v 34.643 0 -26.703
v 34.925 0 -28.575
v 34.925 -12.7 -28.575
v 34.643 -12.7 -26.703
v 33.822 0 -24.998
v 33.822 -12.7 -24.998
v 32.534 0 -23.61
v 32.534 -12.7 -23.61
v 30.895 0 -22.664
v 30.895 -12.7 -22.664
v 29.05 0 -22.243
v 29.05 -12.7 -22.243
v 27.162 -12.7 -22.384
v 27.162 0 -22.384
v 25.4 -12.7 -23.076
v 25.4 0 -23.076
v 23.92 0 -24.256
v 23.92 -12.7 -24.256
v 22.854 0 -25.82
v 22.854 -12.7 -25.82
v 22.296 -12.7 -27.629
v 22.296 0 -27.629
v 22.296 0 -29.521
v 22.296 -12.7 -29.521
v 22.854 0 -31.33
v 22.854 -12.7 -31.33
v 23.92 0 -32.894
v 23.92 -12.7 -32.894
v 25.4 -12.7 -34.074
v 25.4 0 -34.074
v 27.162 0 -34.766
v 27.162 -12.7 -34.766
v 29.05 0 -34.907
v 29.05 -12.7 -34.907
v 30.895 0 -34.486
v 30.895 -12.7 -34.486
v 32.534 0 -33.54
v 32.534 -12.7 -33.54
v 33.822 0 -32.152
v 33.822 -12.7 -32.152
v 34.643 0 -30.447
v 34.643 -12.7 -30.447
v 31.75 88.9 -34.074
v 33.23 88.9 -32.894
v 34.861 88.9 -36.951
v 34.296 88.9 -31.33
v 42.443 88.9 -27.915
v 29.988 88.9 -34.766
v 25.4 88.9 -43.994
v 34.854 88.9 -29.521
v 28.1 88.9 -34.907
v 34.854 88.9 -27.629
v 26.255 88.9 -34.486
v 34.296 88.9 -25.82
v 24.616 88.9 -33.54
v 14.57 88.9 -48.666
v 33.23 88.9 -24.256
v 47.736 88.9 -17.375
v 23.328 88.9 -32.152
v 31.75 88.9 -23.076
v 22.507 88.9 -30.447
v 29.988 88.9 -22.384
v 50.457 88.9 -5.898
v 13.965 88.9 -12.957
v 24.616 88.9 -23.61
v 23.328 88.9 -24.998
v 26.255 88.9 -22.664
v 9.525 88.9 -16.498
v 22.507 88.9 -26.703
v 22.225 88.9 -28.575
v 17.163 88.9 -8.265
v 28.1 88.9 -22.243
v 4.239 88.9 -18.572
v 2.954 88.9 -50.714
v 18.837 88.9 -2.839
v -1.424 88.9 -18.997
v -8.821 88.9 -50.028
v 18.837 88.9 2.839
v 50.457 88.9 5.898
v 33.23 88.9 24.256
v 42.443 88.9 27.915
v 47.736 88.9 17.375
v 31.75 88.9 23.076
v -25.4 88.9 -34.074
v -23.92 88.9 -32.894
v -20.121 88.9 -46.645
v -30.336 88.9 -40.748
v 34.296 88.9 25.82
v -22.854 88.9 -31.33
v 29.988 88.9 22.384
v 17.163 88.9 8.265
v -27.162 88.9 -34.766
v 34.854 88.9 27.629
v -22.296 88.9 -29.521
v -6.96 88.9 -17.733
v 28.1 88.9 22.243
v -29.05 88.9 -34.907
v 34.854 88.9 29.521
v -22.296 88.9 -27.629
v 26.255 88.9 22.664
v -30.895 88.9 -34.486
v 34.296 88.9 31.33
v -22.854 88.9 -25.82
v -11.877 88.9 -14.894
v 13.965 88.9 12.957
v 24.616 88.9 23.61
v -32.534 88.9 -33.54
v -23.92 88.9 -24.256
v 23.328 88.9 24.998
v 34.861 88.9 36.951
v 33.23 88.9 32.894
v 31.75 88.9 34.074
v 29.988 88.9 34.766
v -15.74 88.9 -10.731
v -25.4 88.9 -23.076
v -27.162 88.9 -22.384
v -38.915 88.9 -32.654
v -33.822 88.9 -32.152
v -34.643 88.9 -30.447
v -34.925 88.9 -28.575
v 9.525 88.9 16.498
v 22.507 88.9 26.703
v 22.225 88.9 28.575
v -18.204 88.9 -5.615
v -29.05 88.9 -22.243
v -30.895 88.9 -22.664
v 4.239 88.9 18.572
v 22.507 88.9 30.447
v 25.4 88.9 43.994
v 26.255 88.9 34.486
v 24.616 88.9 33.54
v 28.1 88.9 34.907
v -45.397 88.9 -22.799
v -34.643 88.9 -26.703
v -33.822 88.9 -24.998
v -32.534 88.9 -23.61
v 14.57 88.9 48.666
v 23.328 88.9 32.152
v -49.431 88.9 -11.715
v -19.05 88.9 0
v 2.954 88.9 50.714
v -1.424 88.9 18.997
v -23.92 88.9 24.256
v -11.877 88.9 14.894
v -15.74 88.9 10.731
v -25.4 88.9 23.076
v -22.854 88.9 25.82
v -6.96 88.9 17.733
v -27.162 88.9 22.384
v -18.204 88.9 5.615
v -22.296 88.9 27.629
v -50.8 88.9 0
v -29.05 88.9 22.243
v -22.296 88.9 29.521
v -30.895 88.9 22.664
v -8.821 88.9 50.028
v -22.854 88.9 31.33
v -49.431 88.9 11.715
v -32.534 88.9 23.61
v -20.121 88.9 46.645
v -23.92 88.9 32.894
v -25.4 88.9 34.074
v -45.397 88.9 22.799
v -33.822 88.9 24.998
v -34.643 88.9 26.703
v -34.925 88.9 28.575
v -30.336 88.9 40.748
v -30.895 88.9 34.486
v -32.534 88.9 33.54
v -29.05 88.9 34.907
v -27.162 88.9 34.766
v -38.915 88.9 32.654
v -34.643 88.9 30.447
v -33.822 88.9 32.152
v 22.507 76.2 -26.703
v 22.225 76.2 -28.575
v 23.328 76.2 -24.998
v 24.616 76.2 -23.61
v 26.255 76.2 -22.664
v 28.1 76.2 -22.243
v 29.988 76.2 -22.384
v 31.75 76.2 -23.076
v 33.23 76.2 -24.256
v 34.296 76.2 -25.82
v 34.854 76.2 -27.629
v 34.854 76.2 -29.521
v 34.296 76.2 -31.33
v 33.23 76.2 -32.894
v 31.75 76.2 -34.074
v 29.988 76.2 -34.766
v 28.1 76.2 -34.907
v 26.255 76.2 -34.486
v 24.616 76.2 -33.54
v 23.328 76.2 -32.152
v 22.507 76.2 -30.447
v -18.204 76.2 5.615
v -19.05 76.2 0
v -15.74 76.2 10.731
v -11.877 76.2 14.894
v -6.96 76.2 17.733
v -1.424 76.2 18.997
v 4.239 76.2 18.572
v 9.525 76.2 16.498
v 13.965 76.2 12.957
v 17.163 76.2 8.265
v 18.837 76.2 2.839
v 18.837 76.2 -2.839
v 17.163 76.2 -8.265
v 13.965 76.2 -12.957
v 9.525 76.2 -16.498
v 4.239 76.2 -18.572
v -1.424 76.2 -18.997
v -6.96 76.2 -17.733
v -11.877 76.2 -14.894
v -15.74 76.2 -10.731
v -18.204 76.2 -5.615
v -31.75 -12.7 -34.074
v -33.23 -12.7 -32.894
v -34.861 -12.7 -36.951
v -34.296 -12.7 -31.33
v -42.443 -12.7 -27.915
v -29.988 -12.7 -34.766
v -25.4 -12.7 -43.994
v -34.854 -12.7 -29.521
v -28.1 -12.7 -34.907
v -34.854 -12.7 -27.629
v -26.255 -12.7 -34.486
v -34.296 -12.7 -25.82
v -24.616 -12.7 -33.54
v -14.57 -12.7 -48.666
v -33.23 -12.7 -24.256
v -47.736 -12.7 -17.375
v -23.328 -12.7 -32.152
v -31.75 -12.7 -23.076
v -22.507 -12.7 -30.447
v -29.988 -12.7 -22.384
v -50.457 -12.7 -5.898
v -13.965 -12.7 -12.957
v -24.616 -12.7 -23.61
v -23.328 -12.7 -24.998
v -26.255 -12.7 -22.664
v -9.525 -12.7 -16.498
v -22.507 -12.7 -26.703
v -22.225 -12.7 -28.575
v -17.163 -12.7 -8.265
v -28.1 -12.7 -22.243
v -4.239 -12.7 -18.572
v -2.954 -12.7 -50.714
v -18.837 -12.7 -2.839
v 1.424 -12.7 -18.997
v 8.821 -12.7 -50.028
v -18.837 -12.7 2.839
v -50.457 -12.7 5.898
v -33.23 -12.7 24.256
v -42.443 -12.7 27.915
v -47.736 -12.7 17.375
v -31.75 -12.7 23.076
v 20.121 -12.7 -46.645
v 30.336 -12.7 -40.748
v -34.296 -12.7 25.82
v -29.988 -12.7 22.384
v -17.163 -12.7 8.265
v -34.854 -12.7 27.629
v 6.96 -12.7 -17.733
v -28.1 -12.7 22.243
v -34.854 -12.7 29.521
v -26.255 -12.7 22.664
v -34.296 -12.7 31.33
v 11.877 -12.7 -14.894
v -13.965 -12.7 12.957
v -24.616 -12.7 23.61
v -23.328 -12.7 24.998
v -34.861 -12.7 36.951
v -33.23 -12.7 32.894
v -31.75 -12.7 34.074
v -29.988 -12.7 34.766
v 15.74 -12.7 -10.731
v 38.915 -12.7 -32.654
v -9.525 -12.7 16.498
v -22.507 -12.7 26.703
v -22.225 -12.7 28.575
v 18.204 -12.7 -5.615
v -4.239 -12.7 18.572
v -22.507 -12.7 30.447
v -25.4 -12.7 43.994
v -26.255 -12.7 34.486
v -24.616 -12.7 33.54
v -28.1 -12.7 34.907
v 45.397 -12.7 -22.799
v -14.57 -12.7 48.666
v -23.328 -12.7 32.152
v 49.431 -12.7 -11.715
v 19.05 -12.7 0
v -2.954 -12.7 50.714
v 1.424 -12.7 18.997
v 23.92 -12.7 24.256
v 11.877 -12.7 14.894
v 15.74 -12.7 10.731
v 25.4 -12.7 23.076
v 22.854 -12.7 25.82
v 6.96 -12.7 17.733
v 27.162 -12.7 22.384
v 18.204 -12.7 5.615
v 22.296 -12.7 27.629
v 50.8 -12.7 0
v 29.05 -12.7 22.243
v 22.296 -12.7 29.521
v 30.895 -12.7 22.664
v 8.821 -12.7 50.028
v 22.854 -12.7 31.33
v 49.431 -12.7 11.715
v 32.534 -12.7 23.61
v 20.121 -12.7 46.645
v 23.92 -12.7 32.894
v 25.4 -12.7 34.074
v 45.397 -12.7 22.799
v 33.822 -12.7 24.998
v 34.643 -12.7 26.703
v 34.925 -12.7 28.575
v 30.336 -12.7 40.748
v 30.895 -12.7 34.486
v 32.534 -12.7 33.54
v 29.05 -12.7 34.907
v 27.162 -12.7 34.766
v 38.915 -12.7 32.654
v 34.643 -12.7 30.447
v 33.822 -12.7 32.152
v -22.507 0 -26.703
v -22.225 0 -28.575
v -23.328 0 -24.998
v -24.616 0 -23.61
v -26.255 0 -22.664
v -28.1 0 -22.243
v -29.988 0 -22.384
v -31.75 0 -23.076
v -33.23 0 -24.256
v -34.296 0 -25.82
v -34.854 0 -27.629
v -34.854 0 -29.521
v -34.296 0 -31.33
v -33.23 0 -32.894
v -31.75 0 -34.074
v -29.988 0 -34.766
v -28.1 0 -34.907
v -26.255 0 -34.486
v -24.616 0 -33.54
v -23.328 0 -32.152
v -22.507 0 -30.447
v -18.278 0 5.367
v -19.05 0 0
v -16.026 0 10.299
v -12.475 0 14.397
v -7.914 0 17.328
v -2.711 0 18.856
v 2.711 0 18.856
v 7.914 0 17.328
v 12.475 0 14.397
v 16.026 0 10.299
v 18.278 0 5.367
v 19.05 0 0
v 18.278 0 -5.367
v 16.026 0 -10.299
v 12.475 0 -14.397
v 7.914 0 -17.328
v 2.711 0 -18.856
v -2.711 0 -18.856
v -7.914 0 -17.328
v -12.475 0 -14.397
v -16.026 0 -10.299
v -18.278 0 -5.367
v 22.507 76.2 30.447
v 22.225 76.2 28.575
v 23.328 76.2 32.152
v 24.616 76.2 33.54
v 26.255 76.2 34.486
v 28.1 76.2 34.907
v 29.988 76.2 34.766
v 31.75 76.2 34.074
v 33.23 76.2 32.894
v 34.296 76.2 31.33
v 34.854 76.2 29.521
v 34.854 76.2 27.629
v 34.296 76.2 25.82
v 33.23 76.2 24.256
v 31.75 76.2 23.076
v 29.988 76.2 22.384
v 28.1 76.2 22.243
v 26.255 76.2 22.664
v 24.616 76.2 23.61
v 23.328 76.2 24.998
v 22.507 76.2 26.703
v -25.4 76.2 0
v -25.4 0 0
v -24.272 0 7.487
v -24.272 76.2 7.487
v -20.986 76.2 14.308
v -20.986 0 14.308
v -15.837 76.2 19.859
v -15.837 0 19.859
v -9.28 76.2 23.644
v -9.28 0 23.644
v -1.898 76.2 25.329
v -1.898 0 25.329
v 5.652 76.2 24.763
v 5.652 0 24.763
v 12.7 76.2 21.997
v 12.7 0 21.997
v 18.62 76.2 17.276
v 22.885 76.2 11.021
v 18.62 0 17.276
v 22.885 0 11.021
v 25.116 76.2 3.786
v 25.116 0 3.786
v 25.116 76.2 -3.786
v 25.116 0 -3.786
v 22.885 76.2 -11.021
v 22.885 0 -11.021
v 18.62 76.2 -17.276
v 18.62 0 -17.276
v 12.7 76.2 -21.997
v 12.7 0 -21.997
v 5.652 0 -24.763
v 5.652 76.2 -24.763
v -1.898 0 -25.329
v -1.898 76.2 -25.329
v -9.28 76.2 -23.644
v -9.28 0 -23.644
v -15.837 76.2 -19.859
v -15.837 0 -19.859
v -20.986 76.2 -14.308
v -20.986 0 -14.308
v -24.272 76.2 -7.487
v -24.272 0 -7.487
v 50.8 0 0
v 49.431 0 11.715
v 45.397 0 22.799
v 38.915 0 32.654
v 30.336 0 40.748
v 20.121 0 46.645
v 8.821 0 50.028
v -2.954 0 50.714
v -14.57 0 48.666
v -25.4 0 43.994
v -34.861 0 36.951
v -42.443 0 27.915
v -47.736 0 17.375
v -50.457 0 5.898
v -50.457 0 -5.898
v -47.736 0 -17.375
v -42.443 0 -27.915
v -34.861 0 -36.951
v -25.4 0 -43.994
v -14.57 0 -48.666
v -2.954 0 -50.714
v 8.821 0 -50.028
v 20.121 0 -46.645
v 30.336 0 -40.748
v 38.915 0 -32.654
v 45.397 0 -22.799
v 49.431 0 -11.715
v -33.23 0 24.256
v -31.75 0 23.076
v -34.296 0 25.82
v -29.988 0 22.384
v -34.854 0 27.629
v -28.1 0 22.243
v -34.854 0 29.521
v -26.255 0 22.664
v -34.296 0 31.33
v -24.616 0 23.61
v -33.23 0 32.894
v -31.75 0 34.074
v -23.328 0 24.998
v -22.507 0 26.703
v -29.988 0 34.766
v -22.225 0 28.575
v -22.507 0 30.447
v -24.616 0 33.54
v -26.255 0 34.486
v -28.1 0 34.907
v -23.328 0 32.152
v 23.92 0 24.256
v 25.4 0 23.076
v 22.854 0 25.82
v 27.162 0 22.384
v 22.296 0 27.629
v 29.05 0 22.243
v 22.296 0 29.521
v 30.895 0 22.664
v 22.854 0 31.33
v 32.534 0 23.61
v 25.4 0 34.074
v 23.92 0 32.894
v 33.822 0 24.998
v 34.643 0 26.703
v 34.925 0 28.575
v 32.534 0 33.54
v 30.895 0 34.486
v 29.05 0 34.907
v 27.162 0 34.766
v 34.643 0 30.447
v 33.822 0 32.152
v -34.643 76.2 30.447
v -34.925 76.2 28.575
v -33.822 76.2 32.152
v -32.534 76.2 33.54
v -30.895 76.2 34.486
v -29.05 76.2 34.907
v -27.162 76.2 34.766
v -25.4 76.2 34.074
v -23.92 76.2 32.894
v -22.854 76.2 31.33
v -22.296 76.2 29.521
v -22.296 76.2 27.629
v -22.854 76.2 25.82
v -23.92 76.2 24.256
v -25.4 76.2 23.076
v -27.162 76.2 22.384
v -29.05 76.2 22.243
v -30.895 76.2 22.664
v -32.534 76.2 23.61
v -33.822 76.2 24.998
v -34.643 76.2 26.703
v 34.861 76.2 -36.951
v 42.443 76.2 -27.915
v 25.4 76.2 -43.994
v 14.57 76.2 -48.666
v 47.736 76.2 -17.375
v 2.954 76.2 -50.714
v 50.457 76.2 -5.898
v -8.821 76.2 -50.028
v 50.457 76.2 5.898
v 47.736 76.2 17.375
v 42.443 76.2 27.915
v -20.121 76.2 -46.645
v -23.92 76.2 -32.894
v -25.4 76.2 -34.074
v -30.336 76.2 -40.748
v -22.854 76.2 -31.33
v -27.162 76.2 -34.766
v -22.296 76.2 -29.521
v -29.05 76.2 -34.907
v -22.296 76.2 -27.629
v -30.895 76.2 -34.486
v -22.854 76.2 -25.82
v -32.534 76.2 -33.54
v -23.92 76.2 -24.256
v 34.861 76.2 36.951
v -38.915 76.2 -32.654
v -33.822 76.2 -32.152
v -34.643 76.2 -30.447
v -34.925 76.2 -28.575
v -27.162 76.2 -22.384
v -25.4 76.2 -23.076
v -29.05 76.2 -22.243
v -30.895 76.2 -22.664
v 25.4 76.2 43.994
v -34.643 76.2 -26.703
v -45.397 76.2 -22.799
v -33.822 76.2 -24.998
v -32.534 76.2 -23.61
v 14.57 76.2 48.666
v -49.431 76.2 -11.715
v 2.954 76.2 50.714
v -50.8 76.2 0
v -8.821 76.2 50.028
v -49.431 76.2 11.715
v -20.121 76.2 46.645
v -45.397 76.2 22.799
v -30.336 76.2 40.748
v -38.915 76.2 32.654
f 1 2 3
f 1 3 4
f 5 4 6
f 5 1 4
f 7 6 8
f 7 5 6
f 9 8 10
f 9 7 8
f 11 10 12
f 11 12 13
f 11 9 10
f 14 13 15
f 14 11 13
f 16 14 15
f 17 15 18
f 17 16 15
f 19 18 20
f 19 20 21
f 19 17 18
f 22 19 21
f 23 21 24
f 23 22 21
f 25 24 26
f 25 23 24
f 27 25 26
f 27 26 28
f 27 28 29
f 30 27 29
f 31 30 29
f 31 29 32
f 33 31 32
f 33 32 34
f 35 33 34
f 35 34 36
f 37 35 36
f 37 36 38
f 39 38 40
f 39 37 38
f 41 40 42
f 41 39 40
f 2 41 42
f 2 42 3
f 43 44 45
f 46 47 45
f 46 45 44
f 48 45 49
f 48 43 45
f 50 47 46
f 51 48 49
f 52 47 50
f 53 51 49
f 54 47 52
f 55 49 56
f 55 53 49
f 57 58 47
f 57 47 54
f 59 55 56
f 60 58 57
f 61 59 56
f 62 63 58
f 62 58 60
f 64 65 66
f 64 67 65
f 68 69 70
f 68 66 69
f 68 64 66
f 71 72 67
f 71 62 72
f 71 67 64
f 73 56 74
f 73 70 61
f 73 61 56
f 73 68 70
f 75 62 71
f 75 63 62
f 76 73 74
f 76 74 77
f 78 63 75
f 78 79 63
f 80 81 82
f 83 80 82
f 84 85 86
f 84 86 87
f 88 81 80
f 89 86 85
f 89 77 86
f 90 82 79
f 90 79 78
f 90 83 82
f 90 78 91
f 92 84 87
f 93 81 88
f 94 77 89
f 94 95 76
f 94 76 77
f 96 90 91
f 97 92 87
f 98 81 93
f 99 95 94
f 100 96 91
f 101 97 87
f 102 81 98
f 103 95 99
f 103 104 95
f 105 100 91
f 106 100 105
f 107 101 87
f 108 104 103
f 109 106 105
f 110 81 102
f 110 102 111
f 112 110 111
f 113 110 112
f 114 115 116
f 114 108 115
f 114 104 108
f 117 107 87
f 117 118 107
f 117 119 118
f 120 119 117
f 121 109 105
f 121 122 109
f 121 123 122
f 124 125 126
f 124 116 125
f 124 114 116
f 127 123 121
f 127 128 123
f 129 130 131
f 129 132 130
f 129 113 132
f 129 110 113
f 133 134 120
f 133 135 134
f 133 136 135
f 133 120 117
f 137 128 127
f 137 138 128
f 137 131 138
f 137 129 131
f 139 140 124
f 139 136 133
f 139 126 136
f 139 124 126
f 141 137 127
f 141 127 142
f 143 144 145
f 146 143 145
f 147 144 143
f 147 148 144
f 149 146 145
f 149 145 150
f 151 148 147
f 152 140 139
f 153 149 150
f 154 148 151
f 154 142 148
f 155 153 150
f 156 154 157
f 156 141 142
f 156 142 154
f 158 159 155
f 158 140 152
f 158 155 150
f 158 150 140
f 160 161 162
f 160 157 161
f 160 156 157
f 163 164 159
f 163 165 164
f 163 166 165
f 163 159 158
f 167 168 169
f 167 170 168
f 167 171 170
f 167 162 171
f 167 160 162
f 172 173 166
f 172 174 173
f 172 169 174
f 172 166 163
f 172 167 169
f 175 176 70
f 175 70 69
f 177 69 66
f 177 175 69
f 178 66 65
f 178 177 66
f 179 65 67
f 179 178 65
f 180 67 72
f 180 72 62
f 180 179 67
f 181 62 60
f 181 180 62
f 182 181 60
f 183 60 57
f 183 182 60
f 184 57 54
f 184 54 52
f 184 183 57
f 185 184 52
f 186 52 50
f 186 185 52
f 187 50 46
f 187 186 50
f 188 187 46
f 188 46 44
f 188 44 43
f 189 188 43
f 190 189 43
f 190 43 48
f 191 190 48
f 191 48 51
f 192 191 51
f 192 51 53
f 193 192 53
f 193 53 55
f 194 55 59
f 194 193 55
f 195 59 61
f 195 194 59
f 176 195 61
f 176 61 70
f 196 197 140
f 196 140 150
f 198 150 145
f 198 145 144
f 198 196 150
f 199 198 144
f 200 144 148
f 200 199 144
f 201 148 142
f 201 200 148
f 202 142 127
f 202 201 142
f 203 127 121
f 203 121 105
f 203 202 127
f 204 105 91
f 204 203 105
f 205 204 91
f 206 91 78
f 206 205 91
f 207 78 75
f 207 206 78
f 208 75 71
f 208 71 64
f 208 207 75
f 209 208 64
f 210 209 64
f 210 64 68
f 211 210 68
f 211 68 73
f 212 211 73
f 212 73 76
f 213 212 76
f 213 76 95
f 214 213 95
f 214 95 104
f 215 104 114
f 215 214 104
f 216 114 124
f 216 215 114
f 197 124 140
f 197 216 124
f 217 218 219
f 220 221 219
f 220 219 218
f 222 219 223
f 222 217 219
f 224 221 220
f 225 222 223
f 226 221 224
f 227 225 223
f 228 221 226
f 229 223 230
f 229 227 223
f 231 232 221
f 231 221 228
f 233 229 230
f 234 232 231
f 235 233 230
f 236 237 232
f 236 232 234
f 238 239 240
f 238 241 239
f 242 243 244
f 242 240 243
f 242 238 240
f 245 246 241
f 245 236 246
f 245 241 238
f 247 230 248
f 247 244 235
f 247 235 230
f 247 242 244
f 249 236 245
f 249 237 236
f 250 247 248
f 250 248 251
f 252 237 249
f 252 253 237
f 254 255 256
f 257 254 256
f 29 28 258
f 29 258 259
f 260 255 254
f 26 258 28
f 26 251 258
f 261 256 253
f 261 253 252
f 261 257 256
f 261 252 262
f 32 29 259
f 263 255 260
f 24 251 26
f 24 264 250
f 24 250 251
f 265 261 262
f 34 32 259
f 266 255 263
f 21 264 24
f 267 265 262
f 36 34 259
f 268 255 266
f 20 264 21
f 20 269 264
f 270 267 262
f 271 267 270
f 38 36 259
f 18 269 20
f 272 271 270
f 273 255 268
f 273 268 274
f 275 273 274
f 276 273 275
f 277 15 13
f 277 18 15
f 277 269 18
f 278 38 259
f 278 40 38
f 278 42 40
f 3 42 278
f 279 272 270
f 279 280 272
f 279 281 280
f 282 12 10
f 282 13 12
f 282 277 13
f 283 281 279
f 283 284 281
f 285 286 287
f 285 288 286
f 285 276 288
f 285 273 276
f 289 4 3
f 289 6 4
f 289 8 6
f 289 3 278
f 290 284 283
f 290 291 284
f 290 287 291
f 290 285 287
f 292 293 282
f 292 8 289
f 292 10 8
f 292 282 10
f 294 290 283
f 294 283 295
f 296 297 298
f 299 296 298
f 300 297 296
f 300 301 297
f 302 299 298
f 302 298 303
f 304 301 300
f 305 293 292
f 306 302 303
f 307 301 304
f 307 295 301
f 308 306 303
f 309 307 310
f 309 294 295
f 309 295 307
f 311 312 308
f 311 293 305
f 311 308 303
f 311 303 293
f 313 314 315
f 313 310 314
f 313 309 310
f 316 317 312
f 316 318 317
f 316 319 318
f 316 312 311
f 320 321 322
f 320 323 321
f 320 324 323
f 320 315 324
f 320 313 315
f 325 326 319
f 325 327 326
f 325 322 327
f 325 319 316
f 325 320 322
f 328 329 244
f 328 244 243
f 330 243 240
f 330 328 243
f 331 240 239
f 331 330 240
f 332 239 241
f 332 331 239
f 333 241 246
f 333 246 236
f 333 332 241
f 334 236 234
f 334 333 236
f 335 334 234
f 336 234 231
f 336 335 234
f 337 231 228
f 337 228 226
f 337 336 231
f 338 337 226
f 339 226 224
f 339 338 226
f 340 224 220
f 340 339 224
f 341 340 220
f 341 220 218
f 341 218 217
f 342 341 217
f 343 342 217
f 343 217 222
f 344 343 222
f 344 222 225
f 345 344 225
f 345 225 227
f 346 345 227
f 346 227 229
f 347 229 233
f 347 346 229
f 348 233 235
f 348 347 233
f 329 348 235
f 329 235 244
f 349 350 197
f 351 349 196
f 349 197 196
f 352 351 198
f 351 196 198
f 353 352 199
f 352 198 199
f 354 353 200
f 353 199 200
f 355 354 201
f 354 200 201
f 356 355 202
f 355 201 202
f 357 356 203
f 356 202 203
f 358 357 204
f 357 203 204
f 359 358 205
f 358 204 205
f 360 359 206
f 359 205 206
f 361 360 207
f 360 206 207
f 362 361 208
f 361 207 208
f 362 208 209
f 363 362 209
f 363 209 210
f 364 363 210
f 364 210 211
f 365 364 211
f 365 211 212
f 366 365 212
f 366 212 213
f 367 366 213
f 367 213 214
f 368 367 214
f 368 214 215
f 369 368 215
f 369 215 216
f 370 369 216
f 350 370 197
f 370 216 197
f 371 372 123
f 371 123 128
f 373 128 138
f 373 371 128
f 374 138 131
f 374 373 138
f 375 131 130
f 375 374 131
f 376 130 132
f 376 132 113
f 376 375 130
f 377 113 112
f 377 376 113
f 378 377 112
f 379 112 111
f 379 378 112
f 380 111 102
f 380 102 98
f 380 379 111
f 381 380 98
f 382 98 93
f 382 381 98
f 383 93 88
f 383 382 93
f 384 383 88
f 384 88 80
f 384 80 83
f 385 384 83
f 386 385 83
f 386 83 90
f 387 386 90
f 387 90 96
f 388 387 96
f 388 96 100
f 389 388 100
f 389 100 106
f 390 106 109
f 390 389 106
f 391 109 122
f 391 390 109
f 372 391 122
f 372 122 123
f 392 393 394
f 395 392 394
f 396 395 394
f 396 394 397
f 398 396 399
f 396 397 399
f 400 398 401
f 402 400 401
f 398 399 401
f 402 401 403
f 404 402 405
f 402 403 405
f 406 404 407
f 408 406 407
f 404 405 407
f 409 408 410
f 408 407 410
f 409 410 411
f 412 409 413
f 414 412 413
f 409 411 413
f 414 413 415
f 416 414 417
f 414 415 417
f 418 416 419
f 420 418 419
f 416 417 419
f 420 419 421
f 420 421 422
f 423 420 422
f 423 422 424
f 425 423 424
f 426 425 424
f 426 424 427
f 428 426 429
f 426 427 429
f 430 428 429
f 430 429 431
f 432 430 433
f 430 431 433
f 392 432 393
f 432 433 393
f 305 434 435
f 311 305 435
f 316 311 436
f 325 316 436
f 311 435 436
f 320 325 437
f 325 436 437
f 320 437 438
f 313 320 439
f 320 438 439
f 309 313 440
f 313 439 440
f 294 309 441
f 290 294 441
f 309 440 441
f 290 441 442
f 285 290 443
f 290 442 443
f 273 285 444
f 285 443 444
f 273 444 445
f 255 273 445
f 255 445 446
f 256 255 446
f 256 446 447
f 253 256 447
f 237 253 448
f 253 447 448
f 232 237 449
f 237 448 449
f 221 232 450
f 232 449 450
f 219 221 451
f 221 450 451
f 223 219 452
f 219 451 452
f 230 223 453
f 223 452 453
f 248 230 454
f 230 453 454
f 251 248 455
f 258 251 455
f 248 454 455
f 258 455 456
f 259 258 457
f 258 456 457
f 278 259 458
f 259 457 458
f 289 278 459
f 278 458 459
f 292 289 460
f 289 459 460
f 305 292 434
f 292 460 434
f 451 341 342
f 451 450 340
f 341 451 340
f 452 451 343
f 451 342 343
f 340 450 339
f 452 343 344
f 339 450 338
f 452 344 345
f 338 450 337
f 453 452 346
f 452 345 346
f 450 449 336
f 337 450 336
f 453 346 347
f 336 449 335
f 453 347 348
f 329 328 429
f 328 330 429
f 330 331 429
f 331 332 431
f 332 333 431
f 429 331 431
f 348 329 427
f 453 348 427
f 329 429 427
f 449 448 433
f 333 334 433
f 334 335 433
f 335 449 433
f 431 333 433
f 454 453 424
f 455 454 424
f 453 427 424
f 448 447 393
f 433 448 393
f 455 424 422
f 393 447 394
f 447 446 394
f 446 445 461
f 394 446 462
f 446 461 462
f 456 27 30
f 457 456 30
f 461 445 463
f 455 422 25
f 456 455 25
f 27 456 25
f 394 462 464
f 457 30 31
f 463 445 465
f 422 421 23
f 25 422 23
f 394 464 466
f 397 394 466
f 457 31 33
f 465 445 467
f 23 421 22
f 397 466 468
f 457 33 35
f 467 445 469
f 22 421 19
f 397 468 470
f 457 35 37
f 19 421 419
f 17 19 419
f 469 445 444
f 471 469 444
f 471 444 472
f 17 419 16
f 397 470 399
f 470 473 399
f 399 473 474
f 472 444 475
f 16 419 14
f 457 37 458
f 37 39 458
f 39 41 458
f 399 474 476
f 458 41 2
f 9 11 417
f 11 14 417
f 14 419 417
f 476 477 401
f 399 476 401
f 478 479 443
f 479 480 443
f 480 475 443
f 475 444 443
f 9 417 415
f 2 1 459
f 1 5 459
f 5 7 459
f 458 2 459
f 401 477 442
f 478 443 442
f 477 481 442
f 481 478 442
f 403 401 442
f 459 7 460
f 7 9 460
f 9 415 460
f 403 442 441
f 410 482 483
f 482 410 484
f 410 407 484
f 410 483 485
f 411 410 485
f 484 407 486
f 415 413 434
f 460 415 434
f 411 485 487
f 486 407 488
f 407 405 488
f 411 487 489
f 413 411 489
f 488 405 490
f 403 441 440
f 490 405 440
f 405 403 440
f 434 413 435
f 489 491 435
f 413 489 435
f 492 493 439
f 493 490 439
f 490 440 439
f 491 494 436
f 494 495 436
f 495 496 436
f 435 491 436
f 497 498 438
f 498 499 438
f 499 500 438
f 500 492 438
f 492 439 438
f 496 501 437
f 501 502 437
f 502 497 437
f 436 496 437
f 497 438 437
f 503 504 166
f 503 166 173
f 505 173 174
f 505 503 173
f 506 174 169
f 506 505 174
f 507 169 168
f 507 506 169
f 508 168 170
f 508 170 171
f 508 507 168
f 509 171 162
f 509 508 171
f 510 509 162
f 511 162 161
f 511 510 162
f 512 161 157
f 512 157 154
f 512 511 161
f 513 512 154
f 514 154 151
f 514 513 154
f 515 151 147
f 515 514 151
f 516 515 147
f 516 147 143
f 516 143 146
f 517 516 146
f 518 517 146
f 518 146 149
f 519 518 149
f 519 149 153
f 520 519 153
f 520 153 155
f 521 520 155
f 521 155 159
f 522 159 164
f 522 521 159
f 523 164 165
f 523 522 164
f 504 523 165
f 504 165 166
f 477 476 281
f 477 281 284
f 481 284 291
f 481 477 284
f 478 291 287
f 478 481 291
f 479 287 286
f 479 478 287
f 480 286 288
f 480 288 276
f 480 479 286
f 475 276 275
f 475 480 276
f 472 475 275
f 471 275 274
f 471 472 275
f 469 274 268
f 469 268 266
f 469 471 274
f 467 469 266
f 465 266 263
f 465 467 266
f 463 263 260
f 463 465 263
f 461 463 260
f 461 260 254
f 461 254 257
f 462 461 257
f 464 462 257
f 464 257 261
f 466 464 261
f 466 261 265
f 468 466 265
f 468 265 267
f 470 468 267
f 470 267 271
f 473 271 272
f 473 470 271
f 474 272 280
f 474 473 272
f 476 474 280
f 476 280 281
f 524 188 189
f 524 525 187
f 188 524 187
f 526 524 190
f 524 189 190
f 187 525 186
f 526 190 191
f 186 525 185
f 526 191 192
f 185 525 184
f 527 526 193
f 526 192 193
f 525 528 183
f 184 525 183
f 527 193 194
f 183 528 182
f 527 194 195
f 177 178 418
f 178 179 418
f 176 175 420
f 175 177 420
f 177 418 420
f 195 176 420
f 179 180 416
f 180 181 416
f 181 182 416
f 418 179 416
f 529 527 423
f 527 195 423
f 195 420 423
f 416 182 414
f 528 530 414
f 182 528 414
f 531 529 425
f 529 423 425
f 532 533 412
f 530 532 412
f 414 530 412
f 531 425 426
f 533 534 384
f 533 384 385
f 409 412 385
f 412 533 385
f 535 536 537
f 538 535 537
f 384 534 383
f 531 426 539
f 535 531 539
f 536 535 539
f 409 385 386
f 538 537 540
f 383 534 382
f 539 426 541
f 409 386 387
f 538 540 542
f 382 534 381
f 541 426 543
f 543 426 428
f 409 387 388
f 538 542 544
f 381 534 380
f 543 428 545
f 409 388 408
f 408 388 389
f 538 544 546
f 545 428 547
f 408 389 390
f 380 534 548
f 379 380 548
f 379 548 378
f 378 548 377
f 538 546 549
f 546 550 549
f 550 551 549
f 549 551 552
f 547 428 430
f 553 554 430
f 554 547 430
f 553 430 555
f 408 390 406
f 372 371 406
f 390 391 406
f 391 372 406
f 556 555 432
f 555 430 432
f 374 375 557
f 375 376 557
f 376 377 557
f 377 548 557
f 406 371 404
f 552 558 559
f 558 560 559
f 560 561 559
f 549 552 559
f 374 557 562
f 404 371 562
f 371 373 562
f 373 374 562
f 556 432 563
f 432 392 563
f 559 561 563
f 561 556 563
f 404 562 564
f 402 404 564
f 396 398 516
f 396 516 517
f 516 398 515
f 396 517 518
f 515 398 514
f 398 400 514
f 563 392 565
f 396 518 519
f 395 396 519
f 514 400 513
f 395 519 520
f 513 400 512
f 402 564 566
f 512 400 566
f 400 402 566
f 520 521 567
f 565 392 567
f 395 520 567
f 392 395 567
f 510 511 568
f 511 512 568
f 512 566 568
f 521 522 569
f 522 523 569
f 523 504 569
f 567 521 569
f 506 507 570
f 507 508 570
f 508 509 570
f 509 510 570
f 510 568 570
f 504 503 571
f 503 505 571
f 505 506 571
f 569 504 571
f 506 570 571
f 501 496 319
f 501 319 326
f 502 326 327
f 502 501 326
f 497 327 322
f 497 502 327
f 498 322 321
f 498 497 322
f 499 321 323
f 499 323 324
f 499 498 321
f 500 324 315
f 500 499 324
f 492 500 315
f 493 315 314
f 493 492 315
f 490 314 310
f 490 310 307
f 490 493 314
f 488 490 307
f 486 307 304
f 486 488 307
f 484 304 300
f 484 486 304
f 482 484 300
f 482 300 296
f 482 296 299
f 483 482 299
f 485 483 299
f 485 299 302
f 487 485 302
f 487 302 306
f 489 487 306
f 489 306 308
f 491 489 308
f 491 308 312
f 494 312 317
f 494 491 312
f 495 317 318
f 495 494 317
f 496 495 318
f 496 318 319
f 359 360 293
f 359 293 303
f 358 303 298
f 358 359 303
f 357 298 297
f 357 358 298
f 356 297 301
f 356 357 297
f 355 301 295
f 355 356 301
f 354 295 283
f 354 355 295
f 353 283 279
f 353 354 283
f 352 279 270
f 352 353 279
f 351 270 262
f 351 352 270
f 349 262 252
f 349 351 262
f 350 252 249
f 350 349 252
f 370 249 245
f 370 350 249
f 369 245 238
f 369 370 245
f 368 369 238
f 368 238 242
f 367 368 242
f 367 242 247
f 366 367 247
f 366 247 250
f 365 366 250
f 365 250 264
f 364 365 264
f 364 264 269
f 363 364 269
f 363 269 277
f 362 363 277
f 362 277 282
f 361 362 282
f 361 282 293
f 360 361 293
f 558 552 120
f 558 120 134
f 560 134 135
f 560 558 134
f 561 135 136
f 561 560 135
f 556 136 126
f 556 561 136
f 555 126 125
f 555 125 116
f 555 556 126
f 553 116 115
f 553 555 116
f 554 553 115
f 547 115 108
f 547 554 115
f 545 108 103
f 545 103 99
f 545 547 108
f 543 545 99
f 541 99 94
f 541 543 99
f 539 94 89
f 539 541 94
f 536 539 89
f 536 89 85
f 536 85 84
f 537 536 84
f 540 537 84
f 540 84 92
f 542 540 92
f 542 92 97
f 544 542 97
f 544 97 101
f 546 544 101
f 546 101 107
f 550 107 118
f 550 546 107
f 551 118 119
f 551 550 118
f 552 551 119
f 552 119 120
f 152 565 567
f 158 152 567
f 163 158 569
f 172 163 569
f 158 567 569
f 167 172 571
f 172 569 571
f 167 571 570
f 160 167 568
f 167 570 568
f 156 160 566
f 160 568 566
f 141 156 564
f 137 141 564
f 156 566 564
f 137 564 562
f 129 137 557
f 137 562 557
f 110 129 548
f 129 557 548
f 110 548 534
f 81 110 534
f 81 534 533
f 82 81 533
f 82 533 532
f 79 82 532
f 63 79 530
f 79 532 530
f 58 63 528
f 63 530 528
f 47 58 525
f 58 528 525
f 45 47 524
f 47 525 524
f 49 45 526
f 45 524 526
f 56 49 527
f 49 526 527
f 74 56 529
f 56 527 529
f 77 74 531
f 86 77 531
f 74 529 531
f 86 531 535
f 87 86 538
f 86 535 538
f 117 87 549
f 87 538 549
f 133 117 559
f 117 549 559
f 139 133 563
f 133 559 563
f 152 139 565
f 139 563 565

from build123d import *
from build123d import SkipClean  # not in build123d's __all__

# Parameters (mm, degrees)
F0_R     = 50.8
F0_R_2   = 6.35
F0_R_3   = 19.05
F1_DEPTH = 12.7
F2_R     = 25.4
F3_DEPTH = 76.2
F4_R     = 50.8
F4_R_2   = 6.35
F4_R_3   = 19.05
F5_DEPTH = 12.7
F6_R     = 19.05
F7_DEPTH = 76.2


# Not quite as in the source:
# - a feature names something its author has since deleted; it is built from what else it names


with BuildPart() as f1:
    # F0 (on Front) → F1 (new body)
    with BuildSketch(Plane.XZ):
        Circle(F0_R)
        with Locations((-28.575, -28.575)):
            Circle(F0_R_2, mode=Mode.SUBTRACT)
        Circle(F0_R_3, mode=Mode.SUBTRACT)
        with Locations((28.575, -28.575)):
            Circle(F0_R_2, mode=Mode.SUBTRACT)
        with Locations((-28.575, 28.575)):
            Circle(F0_R_2, mode=Mode.SUBTRACT)
        with Locations((28.575, 28.575)):
            Circle(F0_R_2, mode=Mode.SUBTRACT)
    extrude(amount=F1_DEPTH)

    # F2 (on face) → F3 (join)
    with BuildSketch(Plane(origin=(0, 0, 0), x_dir=(-1, 0, 0), z_dir=(0, 1, 0))):
        Circle(F2_R)
    extrude(amount=F3_DEPTH)

    # F4 (on face) → F5 (join)
    with BuildSketch(Plane(origin=(0, 76.2, 0), x_dir=(-1, 0, 0), z_dir=(0, 1, 0))):
        Circle(F4_R)
        with Locations((-28.575, -28.575)):
            Circle(F4_R_2, mode=Mode.SUBTRACT)
        Circle(F4_R_3, mode=Mode.SUBTRACT)
        with Locations((28.575, -28.575)):
            Circle(F4_R_2, mode=Mode.SUBTRACT)
        with Locations((-28.575, 28.575)):
            Circle(F4_R_2, mode=Mode.SUBTRACT)
        with Locations((28.575, 28.575)):
            Circle(F4_R_2, mode=Mode.SUBTRACT)
    extrude(amount=F5_DEPTH)

    # F6 (on face) → F7 (cut)
    with BuildSketch(Plane(origin=(0, 76.2, 0), x_dir=(-1, 0, 0), z_dir=(0, 1, 0))):
        Circle(F6_R)
    with SkipClean():  # cleaning this boolean's faces spoils the solid; the shape is the same uncleaned
        extrude(amount=-F7_DEPTH, mode=Mode.SUBTRACT)


solid = f1.part
